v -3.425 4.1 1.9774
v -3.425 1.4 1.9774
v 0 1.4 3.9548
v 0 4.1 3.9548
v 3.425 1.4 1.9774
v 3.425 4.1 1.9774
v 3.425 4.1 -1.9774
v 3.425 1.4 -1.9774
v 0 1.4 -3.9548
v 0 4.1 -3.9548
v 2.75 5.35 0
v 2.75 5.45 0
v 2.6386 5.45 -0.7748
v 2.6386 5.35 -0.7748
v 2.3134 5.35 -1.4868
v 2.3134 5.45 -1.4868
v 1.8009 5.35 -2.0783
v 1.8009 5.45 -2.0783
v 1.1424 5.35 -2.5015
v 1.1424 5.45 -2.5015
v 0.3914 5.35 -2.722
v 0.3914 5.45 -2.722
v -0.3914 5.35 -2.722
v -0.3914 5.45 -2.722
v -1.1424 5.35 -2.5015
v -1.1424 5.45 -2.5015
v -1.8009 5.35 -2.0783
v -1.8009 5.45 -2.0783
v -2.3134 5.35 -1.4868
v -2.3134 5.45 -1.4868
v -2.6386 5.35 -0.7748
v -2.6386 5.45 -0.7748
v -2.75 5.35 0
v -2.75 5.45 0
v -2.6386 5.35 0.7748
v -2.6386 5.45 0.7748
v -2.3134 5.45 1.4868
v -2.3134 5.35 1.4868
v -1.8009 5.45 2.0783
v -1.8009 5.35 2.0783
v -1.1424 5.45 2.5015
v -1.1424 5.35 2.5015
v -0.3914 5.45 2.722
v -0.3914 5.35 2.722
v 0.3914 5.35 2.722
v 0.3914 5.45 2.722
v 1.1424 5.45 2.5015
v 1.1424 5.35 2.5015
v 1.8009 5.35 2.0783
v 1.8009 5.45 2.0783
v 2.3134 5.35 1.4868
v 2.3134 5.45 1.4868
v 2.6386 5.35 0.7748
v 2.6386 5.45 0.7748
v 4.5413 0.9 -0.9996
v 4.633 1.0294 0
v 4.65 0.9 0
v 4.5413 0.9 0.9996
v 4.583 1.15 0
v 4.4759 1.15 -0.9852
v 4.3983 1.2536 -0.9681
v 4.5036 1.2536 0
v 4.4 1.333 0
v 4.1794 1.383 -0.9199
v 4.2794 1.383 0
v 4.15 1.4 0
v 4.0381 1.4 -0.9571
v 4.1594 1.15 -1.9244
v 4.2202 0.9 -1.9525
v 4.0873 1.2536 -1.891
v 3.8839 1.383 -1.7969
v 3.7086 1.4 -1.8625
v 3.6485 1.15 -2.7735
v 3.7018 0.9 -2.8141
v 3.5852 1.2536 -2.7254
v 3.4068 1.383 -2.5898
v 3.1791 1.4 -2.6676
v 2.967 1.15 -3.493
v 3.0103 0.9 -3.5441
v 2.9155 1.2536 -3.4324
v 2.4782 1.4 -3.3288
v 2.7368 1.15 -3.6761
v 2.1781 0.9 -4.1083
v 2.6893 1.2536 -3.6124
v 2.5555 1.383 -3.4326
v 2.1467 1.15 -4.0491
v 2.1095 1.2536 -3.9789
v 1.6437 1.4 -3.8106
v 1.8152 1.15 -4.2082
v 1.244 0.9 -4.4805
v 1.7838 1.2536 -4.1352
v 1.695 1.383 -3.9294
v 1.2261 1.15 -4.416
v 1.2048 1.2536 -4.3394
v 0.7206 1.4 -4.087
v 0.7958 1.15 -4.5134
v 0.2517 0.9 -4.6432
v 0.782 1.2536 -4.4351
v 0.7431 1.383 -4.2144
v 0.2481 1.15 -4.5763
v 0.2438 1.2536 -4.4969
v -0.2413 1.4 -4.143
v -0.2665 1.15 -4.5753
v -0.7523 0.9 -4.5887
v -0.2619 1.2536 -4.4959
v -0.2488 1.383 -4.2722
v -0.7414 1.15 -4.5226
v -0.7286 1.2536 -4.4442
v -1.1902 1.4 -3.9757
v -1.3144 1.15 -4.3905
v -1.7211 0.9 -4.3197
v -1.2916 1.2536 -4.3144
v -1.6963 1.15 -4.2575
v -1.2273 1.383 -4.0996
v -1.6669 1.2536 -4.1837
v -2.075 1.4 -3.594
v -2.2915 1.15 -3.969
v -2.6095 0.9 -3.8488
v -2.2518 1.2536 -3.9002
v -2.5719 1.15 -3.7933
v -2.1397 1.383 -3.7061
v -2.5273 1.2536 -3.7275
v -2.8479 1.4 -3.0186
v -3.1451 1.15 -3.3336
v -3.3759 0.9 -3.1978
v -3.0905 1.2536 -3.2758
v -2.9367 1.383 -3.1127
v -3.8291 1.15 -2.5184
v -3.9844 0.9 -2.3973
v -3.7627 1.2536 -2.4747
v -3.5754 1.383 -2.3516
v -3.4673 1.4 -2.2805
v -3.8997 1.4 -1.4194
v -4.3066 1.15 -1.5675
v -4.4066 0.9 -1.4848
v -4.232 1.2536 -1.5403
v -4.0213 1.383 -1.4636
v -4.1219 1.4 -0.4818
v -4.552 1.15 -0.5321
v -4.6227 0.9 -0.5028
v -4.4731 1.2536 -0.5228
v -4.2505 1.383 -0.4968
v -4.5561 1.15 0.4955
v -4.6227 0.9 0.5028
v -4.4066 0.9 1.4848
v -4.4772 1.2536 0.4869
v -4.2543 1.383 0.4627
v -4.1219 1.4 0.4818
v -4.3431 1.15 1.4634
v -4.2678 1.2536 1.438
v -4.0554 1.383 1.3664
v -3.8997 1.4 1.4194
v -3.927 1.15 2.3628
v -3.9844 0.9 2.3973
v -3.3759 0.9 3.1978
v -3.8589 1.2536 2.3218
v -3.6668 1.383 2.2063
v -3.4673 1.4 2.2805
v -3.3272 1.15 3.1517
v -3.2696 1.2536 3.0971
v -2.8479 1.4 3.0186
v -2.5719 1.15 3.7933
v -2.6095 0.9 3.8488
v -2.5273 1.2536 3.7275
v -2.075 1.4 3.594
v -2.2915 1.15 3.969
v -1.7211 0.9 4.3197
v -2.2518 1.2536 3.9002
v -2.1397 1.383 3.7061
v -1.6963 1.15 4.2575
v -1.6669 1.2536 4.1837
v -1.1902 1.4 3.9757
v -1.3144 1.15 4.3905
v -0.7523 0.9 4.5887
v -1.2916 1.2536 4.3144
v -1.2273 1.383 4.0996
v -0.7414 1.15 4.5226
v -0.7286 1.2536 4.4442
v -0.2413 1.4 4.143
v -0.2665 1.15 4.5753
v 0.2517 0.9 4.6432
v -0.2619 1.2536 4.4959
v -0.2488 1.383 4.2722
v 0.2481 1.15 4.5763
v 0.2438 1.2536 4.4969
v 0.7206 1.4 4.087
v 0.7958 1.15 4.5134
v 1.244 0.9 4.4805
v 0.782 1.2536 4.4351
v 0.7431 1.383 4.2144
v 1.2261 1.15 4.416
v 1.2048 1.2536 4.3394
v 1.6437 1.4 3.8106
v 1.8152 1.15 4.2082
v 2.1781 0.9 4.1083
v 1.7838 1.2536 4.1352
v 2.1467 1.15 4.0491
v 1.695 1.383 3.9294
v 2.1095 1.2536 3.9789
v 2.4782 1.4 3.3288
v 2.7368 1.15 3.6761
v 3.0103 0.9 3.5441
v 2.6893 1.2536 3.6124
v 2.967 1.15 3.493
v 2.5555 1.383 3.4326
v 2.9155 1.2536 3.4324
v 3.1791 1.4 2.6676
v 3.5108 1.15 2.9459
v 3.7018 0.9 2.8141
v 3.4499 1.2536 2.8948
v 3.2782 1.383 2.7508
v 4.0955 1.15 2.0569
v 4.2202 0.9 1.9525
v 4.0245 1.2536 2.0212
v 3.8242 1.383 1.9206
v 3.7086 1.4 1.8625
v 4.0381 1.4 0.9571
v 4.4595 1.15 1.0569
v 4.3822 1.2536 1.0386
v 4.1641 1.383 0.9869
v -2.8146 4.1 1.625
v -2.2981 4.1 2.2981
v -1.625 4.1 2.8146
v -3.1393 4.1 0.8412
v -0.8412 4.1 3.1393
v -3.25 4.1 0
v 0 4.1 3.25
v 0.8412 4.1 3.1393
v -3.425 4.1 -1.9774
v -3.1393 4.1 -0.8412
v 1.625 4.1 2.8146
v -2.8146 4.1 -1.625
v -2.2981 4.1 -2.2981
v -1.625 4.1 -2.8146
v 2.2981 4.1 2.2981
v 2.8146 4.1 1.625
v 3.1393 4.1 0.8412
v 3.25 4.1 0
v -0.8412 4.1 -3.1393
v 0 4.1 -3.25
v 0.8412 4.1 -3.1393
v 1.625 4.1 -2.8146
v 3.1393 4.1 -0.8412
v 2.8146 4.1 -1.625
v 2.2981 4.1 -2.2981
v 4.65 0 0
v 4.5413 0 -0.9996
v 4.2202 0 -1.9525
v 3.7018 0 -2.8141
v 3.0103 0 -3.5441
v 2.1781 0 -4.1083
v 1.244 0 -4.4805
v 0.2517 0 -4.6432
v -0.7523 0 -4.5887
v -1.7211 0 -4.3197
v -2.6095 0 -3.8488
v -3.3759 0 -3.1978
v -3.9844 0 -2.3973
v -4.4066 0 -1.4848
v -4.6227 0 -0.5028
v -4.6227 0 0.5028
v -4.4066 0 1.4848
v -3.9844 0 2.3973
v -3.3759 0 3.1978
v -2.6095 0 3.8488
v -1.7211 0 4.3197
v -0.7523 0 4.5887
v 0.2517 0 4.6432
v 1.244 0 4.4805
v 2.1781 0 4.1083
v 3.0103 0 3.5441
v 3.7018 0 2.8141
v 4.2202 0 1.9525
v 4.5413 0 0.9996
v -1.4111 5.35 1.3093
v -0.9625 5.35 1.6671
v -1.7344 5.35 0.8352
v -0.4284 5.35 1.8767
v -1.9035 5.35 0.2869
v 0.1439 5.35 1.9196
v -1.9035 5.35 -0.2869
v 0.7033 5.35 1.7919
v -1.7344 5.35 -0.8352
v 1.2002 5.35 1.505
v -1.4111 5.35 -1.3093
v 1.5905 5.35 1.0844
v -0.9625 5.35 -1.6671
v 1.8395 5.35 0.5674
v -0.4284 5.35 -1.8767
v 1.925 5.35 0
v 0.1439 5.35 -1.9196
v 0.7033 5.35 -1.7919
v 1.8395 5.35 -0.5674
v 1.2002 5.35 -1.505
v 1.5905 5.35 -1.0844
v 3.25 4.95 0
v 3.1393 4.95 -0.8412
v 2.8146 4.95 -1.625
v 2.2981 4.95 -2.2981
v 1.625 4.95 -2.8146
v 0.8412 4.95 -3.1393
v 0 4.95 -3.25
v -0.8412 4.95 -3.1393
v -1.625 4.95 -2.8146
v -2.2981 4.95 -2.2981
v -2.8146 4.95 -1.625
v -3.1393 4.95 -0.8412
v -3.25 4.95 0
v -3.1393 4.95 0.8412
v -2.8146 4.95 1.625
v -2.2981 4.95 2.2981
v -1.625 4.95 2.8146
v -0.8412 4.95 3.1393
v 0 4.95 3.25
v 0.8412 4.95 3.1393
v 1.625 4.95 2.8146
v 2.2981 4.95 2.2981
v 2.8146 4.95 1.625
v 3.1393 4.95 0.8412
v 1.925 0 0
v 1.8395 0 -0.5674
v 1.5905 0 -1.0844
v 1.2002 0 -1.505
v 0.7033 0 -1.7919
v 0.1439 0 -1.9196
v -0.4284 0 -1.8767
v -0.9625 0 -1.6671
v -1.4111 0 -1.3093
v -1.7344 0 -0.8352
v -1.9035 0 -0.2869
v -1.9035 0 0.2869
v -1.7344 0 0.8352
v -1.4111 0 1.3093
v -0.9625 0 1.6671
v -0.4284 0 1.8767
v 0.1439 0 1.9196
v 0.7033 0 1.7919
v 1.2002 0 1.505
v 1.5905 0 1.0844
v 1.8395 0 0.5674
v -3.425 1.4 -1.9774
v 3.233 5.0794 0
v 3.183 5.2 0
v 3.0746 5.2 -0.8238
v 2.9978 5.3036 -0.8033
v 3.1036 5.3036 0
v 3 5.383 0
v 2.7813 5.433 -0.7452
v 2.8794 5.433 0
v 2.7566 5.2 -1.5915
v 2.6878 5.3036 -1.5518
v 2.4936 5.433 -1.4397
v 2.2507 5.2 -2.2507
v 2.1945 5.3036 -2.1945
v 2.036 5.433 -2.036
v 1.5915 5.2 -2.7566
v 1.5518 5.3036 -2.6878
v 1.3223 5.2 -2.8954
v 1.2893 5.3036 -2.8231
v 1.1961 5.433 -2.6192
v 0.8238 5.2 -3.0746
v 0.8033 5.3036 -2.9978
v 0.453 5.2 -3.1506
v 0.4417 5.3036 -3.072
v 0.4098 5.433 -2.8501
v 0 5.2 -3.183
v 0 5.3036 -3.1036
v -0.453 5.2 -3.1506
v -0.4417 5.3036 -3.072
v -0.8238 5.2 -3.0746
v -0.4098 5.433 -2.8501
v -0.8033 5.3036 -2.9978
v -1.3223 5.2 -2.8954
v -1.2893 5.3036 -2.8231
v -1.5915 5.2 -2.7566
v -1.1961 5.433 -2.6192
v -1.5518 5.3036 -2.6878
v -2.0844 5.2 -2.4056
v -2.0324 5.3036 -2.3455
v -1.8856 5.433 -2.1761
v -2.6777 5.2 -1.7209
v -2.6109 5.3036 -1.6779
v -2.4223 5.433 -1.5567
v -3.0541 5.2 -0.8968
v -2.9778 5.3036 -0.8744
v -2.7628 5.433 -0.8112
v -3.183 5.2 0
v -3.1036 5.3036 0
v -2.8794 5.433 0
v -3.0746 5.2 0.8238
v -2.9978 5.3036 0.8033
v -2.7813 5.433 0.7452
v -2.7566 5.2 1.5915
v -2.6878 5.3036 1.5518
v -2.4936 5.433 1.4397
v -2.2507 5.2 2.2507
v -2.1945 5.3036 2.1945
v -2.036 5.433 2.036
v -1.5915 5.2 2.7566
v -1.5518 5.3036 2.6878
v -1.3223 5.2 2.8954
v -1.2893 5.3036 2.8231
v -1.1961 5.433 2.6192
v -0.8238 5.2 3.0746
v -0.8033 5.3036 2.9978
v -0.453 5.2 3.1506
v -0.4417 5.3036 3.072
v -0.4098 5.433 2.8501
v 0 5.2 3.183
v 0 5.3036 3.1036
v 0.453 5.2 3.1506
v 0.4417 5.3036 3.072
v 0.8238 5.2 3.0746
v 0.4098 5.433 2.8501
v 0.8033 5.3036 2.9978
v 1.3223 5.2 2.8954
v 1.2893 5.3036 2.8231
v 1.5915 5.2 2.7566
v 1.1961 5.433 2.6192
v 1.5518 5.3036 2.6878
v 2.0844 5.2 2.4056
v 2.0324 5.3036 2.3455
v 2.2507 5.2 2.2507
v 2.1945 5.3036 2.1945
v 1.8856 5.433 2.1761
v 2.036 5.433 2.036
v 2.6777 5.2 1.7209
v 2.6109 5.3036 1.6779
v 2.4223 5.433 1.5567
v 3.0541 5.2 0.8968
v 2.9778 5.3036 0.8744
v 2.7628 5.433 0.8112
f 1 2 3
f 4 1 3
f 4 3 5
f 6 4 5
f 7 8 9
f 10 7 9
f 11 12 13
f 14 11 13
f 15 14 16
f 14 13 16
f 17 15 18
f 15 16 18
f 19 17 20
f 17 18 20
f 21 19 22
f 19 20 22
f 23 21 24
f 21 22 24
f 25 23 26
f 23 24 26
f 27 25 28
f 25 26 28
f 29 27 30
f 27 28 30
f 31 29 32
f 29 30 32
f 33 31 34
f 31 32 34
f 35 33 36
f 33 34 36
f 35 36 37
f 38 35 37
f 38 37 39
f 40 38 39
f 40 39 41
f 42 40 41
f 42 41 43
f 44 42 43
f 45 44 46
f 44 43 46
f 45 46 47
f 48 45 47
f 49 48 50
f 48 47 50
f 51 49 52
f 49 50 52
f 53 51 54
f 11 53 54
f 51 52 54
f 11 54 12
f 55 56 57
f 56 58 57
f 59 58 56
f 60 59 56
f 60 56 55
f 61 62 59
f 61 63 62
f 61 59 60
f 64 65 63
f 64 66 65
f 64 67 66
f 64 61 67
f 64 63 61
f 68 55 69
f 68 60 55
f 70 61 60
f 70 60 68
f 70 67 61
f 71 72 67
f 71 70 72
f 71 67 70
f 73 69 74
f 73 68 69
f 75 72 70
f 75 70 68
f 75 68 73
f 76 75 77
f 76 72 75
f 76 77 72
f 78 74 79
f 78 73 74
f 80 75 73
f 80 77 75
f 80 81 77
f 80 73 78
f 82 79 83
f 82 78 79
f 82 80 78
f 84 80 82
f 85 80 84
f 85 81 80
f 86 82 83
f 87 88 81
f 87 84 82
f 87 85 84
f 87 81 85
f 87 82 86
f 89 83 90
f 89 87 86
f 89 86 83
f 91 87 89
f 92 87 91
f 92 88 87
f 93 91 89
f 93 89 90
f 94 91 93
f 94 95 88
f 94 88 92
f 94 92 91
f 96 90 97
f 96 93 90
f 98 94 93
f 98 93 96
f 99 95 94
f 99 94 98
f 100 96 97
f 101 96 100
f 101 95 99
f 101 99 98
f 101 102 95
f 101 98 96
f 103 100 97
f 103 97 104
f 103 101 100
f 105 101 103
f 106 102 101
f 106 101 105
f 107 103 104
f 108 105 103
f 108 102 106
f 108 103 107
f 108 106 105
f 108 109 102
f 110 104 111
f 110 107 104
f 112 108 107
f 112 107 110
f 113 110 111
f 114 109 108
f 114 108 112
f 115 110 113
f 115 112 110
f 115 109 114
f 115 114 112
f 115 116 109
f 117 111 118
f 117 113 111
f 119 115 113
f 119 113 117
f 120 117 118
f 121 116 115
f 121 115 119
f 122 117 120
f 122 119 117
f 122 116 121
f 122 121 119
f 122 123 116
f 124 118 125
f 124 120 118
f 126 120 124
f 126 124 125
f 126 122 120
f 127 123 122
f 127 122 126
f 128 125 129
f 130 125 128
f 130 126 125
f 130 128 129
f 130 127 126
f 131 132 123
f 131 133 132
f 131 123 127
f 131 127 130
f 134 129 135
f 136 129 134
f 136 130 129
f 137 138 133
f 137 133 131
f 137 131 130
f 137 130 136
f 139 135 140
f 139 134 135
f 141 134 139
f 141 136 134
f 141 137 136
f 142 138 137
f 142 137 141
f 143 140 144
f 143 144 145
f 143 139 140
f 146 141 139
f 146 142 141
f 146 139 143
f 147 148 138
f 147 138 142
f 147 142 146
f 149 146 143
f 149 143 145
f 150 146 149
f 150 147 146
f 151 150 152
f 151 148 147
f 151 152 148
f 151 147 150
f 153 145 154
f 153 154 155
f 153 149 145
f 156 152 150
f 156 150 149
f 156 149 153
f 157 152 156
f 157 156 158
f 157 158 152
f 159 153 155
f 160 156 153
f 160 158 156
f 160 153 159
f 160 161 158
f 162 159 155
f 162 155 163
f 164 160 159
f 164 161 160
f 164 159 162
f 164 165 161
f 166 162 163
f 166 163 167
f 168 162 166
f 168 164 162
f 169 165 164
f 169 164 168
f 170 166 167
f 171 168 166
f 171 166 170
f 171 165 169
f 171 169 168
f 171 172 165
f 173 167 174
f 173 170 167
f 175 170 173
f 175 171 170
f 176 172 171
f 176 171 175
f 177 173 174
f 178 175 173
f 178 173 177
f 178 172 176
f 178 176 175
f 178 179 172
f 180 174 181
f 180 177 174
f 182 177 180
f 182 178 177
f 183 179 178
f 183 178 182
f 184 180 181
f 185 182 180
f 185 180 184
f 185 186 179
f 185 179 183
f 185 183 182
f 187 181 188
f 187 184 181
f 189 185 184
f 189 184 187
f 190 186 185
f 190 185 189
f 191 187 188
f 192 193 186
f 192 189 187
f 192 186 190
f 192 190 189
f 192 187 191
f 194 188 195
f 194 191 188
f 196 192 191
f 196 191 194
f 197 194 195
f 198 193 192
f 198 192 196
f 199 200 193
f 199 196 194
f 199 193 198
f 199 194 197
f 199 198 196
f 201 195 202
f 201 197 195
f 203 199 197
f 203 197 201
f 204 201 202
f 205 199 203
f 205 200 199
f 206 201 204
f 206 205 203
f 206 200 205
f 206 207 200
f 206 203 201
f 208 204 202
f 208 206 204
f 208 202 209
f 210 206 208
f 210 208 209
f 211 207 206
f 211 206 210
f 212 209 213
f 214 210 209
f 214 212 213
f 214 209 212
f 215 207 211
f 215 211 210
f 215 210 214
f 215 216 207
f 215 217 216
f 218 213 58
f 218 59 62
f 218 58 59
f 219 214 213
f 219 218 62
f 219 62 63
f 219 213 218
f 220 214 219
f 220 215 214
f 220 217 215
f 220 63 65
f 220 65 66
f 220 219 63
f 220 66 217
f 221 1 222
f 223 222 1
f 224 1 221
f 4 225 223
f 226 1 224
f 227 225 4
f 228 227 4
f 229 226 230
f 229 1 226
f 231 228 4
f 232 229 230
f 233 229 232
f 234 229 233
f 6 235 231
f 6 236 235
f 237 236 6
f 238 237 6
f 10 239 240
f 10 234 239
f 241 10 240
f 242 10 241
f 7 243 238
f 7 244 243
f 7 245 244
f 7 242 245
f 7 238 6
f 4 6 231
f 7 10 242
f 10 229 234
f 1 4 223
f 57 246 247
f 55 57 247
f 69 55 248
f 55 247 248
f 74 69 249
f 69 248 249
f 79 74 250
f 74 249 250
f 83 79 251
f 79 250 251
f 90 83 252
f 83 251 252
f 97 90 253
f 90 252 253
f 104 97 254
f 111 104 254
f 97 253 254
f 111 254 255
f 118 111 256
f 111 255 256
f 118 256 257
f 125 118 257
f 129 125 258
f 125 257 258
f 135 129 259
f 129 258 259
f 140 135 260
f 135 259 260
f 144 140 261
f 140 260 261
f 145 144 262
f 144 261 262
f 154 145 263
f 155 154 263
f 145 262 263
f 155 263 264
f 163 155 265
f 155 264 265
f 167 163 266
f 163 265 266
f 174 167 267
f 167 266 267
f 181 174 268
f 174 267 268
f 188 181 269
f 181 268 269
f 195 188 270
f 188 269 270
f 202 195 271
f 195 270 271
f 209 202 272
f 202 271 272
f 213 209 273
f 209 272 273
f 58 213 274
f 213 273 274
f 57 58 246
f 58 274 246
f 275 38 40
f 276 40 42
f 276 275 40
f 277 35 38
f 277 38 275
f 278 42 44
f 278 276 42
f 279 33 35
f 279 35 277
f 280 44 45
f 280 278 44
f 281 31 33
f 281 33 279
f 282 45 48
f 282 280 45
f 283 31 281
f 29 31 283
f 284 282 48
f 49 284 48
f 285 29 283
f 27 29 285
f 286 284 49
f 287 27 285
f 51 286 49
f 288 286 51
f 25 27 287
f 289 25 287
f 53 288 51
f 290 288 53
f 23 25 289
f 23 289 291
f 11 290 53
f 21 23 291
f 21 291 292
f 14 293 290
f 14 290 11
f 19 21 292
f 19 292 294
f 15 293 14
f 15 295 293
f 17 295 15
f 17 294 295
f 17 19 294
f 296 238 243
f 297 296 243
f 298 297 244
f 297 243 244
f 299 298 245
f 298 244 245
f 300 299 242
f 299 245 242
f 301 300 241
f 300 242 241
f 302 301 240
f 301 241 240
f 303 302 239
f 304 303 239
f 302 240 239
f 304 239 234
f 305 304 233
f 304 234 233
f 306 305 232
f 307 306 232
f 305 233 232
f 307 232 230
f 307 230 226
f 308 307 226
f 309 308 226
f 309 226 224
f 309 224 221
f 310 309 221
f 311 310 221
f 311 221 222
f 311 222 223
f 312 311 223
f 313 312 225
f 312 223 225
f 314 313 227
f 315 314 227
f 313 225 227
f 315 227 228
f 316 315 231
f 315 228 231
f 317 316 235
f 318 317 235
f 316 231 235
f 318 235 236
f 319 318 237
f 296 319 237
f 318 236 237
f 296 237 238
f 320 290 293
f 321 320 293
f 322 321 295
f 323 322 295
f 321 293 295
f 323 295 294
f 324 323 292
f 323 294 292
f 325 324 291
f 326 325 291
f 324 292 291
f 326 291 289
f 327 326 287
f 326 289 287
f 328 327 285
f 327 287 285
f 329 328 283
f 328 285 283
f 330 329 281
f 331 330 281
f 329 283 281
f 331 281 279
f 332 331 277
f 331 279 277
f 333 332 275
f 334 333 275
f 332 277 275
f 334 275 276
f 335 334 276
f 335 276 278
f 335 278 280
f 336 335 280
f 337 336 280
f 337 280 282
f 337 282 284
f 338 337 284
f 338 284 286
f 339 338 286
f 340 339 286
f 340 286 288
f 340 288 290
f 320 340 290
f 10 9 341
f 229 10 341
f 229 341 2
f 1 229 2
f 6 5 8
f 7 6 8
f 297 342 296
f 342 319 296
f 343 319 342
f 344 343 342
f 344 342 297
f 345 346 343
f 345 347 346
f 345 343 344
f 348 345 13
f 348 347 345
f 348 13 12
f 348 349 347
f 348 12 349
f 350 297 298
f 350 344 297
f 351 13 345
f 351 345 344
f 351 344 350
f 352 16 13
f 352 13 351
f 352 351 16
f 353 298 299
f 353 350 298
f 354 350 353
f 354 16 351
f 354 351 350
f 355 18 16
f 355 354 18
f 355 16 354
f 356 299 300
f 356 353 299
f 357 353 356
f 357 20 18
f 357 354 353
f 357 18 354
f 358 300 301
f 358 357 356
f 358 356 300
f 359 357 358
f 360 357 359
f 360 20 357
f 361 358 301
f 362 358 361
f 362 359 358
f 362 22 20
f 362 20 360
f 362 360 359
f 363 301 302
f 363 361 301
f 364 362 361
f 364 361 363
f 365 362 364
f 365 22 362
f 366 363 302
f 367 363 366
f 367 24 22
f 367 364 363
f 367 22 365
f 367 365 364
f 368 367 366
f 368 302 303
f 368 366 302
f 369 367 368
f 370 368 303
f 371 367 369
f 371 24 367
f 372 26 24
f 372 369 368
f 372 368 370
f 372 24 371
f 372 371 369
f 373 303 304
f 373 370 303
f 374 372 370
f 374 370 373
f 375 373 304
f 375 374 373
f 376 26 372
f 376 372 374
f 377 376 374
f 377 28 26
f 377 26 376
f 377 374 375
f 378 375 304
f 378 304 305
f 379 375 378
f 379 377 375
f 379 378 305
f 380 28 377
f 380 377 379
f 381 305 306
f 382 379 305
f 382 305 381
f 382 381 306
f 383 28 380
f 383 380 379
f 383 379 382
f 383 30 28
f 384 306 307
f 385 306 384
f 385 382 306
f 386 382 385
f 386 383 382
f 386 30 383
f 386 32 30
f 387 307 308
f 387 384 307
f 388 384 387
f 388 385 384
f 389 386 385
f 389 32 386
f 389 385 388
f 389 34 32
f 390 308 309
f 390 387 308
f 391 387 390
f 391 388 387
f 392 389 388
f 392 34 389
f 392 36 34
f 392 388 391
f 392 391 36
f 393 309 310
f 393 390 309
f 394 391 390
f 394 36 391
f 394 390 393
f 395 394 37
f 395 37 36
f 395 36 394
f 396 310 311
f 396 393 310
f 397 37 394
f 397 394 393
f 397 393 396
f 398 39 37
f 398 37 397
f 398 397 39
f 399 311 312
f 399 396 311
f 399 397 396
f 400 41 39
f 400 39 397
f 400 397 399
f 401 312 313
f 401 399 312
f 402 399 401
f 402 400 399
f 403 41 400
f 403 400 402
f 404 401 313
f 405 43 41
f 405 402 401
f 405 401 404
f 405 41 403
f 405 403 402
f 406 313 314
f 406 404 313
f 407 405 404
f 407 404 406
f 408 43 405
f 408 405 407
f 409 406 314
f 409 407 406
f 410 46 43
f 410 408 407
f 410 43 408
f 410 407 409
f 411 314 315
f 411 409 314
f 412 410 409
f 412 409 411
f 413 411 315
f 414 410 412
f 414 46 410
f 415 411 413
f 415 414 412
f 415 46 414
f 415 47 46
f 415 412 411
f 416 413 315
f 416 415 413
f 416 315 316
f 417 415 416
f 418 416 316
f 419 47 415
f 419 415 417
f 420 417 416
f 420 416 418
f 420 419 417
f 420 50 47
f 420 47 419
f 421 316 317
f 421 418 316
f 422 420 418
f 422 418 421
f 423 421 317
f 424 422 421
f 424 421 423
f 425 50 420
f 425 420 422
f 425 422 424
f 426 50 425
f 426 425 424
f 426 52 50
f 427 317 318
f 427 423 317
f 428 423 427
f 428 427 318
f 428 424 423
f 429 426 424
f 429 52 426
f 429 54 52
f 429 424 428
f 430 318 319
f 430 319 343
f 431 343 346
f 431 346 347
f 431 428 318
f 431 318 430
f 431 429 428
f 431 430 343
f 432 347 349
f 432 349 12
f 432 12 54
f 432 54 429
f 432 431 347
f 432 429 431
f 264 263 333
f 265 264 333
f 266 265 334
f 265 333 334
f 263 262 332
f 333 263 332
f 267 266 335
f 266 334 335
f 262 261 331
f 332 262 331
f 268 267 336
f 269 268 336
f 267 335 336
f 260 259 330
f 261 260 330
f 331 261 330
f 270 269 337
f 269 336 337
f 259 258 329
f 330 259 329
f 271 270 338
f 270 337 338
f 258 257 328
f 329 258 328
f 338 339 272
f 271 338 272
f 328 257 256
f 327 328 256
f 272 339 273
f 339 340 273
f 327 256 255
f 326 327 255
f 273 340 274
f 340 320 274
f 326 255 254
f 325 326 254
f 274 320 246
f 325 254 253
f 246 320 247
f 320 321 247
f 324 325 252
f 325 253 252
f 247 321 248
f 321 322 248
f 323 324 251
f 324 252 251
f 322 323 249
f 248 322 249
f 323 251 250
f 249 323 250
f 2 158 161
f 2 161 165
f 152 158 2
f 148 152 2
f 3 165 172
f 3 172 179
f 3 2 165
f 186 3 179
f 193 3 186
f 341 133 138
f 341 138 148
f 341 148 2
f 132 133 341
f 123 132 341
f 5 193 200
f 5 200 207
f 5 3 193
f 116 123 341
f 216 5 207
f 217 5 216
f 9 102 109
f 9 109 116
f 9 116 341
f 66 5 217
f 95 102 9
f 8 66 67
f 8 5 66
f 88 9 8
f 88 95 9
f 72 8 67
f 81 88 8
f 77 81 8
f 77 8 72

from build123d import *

# Parameters (mm, degrees)
SKETCH1_R           = 4.65
BOSS_EXTRUDE1_DEPTH = 1.4
BOSS_EXTRUDE2_DEPTH = 2.7
SKETCH3_R           = 3.25
BOSS_EXTRUDE3_DEPTH = 1.35
FILLET1_R           = 0.5
CUT_EXTRUDE1_REACH  = 7.45
SKETCH7_R           = 1.925
SKETCH8_R           = 2.75
SKETCH8_R_2         = 1.925
CUT_EXTRUDE2_DEPTH  = 0.1


with BuildPart() as part:
    # Sketch1 → Boss-Extrude1 (new body)
    with BuildSketch(Plane(origin=(0, 0, 0), x_dir=(1, 0, 0), z_dir=(0, 1, 0))):
        Circle(SKETCH1_R)
    extrude(amount=BOSS_EXTRUDE1_DEPTH)

    # Sketch2 → Boss-Extrude2 (add)
    with BuildSketch(Plane(origin=(0, 1.4, 0), x_dir=(1, 0, 0), z_dir=(0, 1, 0))):
        Polygon((0, -3.954849344), (3.425, -1.977424672), (3.425, 1.977424672), (0, 3.954849344), (-3.425, 1.977424672), (-3.425, -1.977424672), align=None)
    extrude(amount=BOSS_EXTRUDE2_DEPTH)

    # Sketch3 → Boss-Extrude3 (add)
    with BuildSketch(Plane(origin=(0, 4.1, 0), x_dir=(1, 0, 0), z_dir=(0, 1, 0))):
        Circle(SKETCH3_R)
    extrude(amount=BOSS_EXTRUDE3_DEPTH)

    # Fillet1
    fillet1_edges = [part.edges().sort_by_distance(p)[0] for p in [
        (-3.25, 5.45, 0),
        (-4.65, 1.4, 0),
    ]]
    fillet(fillet1_edges, radius=FILLET1_R)

    # Sketch7 → Cut-Extrude1 (cut, up to next)
    with BuildSketch(Plane(origin=(0, 5.45, 0), x_dir=(1, 0, 0), z_dir=(0, 1, 0)), mode=Mode.PRIVATE) as cut_extrude1_sk1:
        Circle(SKETCH7_R)
    cut_extrude1_tool1 = extrude(cut_extrude1_sk1.sketch, amount=-CUT_EXTRUDE1_REACH, mode=Mode.PRIVATE) & part.part
    add(cut_extrude1_tool1.solids().sort_by_distance((0, 5.45, 0))[0], mode=Mode.SUBTRACT)

    # Sketch8 → Cut-Extrude2 (cut)
    with BuildSketch(Plane(origin=(0, 5.45, 0), x_dir=(1, 0, 0), z_dir=(0, 1, 0))):
        Circle(SKETCH8_R)
        Circle(SKETCH8_R_2, mode=Mode.SUBTRACT)
    extrude(amount=-CUT_EXTRUDE2_DEPTH, mode=Mode.SUBTRACT)


solid = part.part
